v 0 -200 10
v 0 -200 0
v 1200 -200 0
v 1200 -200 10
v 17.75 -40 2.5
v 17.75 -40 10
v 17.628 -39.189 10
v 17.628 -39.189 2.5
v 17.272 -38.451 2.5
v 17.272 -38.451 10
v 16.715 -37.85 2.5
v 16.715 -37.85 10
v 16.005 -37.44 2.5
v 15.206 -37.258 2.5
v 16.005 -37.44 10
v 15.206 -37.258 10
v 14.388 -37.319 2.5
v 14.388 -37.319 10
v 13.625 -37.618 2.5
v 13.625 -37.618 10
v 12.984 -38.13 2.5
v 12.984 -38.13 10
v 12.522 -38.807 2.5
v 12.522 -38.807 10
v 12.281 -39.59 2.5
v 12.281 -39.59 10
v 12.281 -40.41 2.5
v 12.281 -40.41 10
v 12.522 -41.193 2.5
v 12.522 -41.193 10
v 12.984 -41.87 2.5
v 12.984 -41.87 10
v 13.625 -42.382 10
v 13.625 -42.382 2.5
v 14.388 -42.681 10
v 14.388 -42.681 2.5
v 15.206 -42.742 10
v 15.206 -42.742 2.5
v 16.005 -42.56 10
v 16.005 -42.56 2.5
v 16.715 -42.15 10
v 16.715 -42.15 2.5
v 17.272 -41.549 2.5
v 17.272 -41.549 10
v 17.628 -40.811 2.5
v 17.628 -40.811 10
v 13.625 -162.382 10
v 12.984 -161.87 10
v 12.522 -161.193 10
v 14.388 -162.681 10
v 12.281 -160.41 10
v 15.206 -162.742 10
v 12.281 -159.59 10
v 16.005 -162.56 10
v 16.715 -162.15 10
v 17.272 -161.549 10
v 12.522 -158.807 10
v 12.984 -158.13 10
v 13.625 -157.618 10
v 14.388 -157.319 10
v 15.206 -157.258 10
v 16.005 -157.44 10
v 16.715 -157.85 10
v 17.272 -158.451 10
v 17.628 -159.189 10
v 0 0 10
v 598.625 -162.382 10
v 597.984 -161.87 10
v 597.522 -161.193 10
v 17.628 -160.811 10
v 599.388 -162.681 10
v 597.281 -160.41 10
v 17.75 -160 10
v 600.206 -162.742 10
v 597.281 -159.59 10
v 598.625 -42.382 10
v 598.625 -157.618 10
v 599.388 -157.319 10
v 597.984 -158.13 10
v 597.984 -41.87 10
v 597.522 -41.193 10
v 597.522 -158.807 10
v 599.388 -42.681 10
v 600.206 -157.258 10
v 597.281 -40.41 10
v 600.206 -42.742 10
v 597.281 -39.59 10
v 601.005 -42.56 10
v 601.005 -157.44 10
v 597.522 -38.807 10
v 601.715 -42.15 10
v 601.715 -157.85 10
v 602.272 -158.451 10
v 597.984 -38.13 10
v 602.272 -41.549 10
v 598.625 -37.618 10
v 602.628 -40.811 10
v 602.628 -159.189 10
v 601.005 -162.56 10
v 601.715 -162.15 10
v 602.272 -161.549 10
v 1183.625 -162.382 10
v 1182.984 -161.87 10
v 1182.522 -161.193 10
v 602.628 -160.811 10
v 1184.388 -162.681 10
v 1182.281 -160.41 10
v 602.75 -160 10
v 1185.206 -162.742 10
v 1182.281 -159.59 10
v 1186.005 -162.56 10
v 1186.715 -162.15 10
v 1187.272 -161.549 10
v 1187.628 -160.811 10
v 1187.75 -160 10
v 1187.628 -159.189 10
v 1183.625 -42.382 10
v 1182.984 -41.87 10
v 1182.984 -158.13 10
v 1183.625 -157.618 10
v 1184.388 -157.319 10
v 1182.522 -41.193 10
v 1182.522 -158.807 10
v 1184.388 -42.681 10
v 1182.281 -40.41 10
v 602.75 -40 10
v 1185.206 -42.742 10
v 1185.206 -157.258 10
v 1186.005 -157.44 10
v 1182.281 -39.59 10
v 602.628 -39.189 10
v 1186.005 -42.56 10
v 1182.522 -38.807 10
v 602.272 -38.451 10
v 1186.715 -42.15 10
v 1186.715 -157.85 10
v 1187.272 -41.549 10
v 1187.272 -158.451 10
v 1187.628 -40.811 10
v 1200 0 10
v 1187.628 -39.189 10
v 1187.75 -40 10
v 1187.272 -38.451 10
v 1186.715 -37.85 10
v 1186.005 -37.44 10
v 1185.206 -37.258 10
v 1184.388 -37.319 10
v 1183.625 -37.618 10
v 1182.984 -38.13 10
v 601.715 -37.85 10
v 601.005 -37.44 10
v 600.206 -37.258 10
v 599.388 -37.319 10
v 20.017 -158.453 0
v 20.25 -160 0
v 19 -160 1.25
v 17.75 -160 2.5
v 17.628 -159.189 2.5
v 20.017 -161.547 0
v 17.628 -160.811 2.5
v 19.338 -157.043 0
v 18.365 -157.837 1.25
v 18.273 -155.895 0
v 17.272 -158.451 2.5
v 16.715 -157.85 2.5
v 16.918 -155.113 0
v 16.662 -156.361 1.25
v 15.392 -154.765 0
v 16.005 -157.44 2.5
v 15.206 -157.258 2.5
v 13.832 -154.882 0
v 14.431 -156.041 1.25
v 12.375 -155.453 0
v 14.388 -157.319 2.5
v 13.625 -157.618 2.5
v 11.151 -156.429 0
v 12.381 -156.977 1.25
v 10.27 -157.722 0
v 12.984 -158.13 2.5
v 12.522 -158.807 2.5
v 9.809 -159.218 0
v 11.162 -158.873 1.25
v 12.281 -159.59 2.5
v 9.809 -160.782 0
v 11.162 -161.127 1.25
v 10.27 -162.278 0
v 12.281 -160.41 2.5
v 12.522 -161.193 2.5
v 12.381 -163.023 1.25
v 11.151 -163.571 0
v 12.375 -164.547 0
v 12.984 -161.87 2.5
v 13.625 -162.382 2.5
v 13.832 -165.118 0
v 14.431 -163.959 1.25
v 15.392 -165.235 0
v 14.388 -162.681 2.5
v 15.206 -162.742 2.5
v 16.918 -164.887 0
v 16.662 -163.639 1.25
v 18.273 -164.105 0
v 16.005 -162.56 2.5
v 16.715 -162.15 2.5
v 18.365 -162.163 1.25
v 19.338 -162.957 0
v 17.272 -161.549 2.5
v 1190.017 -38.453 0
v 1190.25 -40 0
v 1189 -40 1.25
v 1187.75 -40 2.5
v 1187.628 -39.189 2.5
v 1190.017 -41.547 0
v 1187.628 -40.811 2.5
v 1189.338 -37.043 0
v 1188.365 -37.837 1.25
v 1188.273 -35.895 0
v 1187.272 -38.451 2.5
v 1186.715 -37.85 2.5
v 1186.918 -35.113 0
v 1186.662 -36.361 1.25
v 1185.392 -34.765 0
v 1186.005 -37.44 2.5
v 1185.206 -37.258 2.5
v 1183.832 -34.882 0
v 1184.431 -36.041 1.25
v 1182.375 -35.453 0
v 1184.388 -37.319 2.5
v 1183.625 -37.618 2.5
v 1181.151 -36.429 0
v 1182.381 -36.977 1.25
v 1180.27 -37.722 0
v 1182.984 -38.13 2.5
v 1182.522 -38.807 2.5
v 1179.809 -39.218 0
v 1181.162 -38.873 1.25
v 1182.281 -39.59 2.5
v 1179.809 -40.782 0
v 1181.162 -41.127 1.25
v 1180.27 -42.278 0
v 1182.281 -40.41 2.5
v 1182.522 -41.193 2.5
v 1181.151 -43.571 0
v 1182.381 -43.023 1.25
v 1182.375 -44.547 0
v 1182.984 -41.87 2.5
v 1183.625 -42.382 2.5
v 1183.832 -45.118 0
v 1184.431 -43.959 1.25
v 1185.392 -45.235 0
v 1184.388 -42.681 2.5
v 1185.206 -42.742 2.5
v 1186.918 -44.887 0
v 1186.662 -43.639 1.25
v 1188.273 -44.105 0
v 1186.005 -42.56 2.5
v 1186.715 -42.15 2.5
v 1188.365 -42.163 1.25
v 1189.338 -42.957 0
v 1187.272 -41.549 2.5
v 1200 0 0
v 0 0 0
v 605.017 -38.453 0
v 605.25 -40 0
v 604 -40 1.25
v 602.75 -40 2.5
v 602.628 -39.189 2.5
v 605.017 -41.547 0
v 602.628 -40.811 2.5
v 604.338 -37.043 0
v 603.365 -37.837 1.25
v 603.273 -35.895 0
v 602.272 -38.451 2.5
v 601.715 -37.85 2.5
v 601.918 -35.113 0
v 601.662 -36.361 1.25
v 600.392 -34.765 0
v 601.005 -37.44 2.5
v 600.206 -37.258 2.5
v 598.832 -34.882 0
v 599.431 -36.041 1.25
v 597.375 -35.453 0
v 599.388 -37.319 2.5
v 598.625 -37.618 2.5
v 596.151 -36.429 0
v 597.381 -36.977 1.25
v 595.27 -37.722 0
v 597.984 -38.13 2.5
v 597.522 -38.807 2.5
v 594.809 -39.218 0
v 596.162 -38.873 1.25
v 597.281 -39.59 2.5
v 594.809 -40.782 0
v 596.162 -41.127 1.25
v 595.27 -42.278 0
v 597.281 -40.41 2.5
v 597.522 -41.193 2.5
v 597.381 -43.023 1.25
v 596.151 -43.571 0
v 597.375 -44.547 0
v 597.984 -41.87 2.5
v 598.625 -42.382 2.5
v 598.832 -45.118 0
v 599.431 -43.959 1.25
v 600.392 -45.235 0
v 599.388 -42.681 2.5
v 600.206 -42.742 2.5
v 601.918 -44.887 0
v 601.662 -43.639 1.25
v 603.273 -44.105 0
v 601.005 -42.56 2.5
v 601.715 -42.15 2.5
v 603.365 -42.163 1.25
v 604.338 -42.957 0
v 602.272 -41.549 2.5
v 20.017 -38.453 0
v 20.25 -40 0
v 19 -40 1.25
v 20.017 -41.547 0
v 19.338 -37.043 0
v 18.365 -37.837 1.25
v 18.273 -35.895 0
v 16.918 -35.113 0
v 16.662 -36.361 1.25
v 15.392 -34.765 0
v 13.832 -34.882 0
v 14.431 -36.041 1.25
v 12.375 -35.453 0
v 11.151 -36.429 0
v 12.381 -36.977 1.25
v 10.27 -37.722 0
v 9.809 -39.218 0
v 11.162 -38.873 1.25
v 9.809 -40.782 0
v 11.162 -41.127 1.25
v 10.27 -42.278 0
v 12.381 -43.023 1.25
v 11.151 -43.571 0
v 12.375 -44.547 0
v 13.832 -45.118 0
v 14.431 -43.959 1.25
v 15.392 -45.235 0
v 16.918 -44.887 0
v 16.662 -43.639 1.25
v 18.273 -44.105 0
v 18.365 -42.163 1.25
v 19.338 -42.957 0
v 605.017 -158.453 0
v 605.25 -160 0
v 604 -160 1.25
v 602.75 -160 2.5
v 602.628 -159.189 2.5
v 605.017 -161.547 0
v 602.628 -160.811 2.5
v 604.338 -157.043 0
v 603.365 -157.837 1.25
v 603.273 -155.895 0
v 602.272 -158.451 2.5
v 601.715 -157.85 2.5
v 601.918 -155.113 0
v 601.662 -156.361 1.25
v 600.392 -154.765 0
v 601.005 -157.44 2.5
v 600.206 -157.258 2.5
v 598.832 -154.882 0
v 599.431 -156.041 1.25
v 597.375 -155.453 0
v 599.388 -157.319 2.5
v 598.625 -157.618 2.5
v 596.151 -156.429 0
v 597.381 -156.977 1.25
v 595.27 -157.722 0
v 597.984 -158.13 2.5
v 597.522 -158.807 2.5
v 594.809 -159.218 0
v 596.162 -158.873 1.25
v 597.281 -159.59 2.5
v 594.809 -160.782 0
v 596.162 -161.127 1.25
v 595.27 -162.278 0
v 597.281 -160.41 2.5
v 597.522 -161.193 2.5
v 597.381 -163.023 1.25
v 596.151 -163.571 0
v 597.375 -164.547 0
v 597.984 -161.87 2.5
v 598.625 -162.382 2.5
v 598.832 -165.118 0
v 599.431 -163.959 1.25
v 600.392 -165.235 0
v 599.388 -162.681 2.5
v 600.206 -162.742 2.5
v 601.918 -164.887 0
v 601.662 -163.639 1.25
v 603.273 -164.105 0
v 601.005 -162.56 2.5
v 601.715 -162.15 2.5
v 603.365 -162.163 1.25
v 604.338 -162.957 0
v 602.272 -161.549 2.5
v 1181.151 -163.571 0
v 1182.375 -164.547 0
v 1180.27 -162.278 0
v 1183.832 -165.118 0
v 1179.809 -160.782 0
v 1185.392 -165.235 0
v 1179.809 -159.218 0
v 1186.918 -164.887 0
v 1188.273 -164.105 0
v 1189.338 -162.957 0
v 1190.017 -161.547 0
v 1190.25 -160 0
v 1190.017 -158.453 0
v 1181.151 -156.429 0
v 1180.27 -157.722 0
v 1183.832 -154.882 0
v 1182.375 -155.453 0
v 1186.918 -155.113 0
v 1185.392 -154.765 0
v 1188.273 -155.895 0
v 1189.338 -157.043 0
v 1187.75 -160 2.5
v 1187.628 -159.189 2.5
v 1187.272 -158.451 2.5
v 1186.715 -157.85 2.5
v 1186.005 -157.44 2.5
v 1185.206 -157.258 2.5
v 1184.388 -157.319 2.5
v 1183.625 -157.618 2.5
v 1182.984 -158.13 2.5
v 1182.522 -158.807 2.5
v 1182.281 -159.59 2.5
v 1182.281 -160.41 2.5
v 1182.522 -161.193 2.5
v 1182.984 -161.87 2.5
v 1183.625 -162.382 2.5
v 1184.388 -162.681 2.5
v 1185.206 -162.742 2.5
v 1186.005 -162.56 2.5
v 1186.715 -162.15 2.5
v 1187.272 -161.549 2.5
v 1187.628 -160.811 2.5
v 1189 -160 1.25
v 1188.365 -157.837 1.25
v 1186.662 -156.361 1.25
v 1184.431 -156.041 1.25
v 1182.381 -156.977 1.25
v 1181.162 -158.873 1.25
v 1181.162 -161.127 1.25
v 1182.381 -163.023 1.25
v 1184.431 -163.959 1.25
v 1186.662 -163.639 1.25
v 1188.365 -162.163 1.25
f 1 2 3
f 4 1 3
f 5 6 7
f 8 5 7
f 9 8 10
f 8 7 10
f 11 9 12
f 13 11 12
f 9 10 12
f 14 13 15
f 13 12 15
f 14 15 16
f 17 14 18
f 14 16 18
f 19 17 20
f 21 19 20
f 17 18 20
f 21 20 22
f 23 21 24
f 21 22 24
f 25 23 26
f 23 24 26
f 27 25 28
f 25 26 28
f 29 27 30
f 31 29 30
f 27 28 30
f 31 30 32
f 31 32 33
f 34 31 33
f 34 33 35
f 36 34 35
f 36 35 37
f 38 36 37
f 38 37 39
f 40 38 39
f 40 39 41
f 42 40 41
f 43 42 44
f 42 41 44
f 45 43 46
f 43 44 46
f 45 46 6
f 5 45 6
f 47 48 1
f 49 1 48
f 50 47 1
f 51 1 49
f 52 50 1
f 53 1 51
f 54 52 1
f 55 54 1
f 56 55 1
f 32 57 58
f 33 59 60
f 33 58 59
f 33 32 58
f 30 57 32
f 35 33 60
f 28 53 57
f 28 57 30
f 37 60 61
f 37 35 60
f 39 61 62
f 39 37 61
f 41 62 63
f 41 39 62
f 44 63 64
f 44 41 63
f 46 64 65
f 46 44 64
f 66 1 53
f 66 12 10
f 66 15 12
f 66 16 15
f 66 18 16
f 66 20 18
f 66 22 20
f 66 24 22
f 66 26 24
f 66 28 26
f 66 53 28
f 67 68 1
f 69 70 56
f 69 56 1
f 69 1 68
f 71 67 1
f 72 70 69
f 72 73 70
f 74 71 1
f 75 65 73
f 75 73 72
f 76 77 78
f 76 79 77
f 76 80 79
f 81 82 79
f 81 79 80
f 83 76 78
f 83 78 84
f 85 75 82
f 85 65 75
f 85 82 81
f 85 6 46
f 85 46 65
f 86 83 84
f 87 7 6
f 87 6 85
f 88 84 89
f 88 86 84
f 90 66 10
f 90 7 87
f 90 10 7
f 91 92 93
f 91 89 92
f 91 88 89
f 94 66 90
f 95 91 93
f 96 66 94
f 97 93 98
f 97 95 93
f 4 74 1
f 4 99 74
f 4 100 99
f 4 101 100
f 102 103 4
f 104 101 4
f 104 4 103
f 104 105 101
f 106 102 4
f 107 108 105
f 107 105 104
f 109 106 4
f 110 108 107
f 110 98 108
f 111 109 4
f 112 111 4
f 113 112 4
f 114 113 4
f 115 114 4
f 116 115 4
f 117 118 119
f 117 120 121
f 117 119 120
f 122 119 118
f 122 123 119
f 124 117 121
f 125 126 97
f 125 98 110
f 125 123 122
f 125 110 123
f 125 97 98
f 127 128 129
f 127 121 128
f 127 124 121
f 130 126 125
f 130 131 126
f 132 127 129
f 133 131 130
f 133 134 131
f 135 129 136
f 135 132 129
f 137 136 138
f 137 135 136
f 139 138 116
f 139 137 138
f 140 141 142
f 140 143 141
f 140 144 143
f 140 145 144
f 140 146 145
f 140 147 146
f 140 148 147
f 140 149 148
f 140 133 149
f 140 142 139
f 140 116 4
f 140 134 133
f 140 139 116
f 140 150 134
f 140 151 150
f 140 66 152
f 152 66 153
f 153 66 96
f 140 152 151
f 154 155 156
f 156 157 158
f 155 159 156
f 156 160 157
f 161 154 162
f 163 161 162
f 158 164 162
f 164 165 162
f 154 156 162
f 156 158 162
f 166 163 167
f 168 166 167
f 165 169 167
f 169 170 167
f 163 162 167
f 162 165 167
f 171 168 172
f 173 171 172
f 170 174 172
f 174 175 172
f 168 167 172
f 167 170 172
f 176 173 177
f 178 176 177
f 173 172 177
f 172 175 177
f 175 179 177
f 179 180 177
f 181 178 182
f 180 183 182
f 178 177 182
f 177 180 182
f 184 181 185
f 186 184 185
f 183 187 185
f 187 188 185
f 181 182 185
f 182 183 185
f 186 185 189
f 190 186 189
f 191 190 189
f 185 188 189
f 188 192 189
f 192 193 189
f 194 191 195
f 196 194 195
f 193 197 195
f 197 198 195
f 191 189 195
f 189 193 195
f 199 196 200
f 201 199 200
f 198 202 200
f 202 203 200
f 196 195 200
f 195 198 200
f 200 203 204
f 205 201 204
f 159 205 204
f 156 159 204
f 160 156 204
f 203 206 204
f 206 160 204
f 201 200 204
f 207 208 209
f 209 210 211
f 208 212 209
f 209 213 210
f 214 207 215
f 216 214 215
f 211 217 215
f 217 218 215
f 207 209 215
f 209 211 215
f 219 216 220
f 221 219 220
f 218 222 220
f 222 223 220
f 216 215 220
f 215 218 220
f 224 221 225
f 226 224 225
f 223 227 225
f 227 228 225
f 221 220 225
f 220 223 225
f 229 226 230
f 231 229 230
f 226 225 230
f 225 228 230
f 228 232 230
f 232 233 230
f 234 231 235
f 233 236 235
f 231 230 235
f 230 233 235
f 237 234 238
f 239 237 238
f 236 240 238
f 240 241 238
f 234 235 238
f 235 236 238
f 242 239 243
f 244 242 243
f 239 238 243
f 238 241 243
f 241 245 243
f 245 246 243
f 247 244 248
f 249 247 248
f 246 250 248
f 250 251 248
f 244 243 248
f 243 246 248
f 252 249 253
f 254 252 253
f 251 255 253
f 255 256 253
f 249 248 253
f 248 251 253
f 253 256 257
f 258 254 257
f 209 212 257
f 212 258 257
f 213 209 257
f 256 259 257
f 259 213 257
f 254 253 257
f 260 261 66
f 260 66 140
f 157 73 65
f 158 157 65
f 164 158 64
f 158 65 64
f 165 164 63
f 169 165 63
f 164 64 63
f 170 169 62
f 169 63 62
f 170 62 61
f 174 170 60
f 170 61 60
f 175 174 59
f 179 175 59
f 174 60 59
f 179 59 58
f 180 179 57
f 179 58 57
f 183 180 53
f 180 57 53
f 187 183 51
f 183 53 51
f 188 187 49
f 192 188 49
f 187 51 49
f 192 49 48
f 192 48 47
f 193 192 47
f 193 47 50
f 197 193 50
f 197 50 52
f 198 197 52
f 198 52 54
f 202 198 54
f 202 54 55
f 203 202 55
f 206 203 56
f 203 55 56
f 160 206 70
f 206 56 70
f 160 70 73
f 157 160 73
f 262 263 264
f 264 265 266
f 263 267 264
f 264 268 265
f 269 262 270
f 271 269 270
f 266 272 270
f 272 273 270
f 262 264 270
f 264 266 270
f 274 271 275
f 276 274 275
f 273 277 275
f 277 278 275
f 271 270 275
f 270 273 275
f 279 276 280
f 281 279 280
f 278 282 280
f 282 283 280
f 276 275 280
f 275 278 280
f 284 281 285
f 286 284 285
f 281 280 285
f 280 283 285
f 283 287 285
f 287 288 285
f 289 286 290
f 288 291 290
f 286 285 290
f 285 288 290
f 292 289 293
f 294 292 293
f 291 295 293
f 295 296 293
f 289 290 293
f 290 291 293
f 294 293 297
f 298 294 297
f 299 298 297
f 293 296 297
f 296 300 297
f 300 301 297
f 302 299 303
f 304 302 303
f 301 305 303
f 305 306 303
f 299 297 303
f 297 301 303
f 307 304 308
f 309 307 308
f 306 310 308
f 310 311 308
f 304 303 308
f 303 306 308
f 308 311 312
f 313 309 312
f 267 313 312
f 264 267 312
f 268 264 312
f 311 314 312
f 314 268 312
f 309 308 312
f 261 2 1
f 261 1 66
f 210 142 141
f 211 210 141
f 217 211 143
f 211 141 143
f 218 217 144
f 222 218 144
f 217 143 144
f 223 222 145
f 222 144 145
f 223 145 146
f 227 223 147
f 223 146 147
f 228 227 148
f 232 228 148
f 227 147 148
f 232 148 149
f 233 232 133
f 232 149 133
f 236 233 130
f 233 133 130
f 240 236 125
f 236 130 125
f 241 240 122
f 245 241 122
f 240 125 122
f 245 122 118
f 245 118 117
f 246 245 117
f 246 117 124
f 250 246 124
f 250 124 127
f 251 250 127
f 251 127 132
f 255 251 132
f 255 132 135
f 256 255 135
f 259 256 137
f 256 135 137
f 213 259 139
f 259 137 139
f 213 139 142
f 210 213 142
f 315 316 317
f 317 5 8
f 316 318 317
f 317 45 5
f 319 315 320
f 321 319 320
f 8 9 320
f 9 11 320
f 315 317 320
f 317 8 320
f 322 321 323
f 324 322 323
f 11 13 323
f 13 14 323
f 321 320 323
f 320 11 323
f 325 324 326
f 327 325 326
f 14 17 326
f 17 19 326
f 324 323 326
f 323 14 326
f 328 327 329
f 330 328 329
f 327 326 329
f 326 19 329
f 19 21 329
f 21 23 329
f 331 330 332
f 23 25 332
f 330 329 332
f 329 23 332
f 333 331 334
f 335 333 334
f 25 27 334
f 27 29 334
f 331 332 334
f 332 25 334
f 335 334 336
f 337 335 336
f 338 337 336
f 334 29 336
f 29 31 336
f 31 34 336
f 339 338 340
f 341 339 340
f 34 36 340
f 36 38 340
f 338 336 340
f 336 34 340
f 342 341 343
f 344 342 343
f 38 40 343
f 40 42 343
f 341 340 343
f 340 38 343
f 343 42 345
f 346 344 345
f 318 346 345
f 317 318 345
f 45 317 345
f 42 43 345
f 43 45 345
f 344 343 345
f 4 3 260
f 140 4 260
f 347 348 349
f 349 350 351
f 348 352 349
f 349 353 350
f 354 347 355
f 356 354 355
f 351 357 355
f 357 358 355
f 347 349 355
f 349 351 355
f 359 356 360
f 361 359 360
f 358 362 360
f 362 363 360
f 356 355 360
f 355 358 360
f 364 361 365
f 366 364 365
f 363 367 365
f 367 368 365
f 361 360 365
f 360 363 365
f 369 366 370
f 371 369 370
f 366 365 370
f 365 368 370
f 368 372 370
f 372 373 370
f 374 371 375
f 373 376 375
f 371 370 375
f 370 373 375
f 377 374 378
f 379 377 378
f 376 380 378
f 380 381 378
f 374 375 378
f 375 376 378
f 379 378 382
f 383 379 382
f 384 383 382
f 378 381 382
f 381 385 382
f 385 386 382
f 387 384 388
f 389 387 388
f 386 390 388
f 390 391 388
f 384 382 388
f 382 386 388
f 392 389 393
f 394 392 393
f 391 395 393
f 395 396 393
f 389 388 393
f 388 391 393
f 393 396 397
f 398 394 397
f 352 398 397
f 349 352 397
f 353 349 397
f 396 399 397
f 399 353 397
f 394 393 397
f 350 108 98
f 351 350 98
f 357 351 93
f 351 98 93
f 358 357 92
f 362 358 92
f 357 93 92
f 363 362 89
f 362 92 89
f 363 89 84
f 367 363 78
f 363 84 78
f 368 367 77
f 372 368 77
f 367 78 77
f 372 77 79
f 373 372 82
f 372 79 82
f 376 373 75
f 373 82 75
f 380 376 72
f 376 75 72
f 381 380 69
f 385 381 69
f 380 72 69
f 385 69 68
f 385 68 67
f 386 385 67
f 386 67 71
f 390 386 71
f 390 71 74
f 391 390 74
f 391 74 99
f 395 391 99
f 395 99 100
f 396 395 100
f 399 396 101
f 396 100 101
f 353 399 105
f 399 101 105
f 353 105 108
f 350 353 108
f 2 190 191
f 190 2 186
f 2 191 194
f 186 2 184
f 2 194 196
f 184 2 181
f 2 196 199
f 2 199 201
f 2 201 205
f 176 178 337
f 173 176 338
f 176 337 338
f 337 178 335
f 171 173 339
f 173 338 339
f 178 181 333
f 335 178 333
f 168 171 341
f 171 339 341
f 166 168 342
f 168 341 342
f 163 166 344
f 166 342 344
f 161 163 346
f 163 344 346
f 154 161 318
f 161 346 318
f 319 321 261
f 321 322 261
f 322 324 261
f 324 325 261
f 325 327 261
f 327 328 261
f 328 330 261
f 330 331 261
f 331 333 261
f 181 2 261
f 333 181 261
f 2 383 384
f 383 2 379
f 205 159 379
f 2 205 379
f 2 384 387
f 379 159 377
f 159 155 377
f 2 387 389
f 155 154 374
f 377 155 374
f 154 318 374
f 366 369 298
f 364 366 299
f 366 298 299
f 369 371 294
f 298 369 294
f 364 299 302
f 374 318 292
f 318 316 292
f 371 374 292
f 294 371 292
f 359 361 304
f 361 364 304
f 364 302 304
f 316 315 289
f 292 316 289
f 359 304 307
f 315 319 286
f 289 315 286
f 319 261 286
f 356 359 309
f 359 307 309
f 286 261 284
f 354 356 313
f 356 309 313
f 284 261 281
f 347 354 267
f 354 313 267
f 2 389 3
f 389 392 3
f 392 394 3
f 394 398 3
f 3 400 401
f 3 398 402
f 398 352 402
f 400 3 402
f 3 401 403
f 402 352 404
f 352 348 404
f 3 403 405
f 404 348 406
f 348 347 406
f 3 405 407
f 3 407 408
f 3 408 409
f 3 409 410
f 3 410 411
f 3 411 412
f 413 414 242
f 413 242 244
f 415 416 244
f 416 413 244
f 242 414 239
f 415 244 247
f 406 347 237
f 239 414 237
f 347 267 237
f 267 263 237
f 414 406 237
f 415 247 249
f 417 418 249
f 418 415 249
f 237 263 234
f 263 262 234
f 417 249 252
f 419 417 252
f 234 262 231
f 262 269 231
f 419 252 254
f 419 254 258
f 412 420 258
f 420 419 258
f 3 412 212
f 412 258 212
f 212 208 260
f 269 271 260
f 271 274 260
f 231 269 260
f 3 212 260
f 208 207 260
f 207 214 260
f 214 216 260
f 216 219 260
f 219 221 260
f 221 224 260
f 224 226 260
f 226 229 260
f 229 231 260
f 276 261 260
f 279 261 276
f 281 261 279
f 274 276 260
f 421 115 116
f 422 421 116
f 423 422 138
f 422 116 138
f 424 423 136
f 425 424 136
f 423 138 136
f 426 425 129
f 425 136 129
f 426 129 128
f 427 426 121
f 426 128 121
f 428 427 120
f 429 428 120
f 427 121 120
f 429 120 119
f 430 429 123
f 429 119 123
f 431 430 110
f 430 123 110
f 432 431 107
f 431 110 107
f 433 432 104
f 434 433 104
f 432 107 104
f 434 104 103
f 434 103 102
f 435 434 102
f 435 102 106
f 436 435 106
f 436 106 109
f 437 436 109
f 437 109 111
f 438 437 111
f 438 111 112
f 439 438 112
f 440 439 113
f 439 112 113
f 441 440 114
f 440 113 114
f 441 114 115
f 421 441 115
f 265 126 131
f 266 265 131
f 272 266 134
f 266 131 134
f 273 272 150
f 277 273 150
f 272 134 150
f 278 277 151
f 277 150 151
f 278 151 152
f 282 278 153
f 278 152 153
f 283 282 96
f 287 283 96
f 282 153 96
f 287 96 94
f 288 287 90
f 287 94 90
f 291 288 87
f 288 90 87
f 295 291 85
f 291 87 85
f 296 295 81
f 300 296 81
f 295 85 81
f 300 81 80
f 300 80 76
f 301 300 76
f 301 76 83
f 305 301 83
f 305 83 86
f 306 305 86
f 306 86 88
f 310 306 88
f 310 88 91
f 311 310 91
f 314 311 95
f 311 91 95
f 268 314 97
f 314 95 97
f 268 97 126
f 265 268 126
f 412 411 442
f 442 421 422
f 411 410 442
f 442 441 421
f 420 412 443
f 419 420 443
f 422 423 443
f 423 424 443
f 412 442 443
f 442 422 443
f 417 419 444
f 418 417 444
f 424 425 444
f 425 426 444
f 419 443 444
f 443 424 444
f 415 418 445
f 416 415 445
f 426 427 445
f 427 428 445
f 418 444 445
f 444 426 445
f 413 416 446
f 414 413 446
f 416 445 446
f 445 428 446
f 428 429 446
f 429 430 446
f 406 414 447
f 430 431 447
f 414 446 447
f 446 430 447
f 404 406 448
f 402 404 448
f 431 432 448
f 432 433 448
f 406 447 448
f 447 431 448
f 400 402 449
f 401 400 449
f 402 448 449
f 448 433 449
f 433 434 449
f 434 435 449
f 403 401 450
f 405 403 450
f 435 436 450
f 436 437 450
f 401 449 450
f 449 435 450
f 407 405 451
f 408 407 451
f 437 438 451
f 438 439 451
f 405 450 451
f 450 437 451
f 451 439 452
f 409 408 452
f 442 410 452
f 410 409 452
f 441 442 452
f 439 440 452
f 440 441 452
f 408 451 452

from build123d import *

# Parameters (mm, degrees)
ESQUISSE1_W             = 1200
ESQUISSE1_H             = 200
BOSS_EXTRU_1_DEPTH      = 10
ESQUISSE2_R             = 2.75
ENL_V_MAT_EXTRU_1_DEPTH = 10
CHANFREIN1_SIZE         = 2.5


with BuildPart() as part:
    # Esquisse1 → Boss.-Extru.1 (new body)
    with BuildSketch(Plane.XY):
        with Locations((600, -100)):
            Rectangle(ESQUISSE1_W, ESQUISSE1_H)
    extrude(amount=BOSS_EXTRU_1_DEPTH)

    # Esquisse2 → Enlèv. mat.-Extru.1 (cut)
    with BuildSketch(Plane.XY.offset(10)):
        with Locations((15, -40)):
            Circle(ESQUISSE2_R)
        with Locations((15, -160)):
            Circle(ESQUISSE2_R)
        with Locations((1185, -40)):
            Circle(ESQUISSE2_R)
        with Locations((1185, -160)):
            Circle(ESQUISSE2_R)
        with Locations((600, -40)):
            Circle(ESQUISSE2_R)
        with Locations((600, -160)):
            Circle(ESQUISSE2_R)
    extrude(amount=-ENL_V_MAT_EXTRU_1_DEPTH, mode=Mode.SUBTRACT)

    # Chanfrein1
    chanfrein1_edges = [part.edges().sort_by_distance(p)[0] for p in [
        (12.25, -40, 0),
        (597.25, -160, 0),
        (597.25, -40, 0),
        (1182.25, -160, 0),
        (1182.25, -40, 0),
        (12.25, -160, 0),
    ]]
    chamfer(chanfrein1_edges, length=CHANFREIN1_SIZE)


solid = part.part
